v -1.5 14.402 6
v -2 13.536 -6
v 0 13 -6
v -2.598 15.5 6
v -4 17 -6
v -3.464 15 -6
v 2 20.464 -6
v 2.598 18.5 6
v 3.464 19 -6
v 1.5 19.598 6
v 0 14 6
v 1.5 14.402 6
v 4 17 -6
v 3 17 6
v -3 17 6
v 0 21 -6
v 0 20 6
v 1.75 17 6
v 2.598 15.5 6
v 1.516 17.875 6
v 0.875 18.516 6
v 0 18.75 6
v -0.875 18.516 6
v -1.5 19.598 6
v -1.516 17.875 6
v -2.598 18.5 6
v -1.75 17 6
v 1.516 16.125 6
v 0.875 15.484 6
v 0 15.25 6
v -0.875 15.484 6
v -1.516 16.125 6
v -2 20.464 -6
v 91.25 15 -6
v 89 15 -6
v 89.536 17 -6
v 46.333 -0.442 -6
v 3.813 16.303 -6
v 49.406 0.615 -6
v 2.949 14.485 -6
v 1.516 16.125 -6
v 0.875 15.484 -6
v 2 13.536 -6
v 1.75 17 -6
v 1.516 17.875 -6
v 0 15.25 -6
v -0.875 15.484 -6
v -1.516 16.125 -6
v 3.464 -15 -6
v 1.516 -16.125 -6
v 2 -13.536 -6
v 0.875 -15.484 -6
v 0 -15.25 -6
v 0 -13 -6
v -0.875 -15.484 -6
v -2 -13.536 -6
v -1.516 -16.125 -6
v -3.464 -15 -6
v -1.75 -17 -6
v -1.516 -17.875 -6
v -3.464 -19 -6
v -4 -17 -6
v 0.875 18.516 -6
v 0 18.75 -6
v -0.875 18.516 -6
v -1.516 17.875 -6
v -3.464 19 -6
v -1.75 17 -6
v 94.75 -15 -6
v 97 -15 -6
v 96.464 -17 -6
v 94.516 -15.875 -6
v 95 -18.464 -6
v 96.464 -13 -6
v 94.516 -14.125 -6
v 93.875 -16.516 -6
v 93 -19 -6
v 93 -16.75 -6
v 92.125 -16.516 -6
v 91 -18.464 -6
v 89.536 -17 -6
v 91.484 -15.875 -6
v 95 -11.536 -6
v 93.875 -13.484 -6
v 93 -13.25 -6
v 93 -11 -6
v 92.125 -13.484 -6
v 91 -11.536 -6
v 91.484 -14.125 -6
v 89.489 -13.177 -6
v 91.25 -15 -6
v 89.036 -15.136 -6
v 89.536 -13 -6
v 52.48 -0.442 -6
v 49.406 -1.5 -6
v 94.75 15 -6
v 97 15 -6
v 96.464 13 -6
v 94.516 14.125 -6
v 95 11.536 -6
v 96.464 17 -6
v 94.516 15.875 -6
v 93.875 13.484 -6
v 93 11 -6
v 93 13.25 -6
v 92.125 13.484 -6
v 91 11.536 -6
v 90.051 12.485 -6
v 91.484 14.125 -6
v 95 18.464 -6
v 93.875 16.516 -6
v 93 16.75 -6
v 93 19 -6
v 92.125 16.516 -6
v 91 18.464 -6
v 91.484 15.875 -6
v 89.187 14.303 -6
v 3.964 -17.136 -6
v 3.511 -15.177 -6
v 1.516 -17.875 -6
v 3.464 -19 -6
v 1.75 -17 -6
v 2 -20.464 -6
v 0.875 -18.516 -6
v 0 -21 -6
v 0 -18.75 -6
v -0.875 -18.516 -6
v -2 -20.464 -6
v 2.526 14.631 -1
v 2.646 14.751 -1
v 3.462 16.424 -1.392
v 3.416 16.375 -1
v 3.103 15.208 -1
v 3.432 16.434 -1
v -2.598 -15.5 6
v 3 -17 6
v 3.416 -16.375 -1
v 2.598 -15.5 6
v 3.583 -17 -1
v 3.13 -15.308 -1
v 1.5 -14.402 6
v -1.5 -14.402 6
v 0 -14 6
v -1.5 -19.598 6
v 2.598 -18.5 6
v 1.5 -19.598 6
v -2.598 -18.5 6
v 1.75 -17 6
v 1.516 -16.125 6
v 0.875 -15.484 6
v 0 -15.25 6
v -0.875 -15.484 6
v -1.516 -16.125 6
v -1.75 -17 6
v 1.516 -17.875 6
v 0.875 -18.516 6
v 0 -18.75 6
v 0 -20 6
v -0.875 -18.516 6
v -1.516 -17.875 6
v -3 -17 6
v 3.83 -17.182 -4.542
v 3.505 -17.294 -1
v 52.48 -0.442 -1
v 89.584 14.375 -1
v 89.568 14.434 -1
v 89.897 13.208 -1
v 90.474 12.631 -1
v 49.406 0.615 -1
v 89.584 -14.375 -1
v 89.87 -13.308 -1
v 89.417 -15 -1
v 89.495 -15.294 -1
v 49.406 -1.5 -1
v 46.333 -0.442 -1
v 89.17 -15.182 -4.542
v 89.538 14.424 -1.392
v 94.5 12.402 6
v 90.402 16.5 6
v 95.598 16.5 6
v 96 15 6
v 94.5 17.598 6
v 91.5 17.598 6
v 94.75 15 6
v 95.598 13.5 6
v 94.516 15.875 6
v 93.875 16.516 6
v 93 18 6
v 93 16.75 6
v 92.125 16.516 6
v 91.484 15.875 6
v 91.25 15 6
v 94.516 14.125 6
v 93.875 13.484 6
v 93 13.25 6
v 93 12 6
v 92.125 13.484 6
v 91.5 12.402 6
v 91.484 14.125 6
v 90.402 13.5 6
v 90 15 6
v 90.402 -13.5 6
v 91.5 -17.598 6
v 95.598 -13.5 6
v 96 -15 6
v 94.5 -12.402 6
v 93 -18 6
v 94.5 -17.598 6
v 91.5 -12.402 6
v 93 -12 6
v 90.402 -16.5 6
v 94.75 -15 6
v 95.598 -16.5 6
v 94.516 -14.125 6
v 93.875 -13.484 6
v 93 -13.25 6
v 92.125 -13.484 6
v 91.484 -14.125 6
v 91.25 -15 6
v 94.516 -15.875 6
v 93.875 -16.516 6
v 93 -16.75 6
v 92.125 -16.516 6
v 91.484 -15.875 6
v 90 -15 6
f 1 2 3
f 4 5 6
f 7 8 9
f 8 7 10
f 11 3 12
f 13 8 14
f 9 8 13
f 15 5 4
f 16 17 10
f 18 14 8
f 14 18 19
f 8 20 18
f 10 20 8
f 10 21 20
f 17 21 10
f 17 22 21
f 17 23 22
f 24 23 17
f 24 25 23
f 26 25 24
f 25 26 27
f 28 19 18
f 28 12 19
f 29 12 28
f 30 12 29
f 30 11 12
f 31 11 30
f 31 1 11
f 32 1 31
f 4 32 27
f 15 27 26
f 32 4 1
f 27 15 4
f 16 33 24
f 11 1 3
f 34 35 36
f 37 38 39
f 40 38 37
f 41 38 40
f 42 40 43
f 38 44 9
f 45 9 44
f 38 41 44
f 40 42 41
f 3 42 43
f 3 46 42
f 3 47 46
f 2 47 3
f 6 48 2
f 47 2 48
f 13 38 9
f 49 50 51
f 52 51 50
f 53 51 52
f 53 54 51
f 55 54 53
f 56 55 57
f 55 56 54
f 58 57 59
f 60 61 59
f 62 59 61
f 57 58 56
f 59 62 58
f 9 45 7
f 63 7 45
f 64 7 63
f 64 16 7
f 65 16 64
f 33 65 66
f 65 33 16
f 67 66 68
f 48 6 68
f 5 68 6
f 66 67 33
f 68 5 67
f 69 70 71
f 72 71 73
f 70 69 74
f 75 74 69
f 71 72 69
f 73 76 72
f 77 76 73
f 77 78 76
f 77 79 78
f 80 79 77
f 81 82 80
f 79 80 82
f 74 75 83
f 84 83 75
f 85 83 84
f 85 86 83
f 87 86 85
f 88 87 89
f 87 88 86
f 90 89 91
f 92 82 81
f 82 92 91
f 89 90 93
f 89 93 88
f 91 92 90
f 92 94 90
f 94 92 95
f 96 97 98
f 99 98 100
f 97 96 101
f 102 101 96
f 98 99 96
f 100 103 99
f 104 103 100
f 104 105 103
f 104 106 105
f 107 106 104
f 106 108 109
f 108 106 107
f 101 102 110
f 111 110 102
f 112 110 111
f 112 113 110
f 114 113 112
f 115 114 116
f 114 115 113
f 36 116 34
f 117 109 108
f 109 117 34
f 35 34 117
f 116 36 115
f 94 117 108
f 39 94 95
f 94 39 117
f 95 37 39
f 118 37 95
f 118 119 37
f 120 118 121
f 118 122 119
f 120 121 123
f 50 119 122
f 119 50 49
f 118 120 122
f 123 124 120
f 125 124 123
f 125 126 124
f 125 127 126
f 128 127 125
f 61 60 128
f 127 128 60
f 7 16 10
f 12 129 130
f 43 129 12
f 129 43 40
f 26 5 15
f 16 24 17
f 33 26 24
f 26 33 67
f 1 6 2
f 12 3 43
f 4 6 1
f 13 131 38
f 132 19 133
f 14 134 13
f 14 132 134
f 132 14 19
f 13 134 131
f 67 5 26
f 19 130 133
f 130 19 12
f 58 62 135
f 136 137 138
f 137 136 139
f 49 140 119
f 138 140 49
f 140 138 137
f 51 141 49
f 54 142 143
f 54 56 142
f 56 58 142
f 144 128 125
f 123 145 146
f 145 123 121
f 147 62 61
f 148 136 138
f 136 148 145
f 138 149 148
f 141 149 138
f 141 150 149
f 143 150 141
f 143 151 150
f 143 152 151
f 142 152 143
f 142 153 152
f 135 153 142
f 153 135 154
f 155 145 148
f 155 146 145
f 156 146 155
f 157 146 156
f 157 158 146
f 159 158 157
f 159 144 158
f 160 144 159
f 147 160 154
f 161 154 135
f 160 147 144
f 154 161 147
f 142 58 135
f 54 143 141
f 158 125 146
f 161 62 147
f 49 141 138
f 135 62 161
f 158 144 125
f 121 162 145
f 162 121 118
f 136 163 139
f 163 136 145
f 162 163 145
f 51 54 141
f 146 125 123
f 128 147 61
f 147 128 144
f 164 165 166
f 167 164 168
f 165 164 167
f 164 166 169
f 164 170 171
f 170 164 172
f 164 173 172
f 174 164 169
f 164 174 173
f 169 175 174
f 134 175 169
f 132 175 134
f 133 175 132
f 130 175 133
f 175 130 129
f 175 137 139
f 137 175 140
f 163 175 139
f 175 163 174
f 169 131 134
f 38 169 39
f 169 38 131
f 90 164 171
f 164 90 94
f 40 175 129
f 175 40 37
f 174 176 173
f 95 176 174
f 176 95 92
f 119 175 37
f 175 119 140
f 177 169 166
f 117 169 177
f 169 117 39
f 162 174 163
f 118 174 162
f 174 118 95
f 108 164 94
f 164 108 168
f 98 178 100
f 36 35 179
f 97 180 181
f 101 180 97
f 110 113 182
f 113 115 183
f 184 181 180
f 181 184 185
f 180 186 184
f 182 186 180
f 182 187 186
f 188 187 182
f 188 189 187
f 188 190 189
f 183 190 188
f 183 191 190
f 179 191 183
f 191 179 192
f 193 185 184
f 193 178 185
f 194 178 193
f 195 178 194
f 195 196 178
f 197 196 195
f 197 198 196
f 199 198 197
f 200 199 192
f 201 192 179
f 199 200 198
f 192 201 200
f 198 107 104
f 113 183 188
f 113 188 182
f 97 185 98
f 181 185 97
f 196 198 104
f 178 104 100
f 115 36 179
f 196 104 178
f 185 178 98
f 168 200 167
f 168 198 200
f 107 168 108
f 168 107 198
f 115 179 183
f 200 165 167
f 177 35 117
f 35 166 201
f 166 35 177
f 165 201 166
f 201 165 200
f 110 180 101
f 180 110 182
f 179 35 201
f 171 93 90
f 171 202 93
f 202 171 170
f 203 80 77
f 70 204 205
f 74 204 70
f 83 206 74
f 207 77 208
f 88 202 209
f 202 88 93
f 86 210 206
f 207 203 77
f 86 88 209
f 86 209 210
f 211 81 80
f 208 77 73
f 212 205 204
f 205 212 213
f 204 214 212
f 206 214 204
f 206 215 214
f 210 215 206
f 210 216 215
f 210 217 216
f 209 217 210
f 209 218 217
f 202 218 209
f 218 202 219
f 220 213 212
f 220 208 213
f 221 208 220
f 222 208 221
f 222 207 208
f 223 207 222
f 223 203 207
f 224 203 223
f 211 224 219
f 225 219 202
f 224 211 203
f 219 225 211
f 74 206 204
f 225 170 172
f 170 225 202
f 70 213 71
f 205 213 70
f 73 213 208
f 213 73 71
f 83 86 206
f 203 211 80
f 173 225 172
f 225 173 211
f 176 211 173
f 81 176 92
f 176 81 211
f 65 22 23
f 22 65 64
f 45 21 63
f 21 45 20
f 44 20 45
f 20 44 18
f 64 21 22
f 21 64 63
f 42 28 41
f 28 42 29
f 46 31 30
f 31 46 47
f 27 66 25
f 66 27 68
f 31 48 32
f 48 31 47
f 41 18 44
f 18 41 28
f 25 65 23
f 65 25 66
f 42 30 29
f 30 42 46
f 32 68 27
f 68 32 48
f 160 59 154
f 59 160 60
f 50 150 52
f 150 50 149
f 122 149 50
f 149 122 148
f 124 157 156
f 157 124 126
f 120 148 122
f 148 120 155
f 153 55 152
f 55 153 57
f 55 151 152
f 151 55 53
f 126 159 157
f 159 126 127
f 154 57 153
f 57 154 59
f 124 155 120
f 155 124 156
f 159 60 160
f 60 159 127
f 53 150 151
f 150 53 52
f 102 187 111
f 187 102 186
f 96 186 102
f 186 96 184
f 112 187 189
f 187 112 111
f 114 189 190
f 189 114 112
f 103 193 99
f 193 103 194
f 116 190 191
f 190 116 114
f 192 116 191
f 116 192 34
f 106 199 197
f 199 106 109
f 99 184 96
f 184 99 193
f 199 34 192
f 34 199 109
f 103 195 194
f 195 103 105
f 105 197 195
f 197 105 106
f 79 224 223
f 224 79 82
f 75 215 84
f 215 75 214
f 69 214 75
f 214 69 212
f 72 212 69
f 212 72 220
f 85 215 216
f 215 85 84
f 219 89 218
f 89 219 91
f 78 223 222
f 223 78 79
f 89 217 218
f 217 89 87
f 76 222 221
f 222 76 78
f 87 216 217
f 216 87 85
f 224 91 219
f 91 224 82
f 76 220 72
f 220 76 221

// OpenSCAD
boss_i_radius = 1.75;
boss_e_radius = 3;
v_space_1 = 34;
h_space = 93;
v_space = 30;
boss_height = 12;

boss_rows = 2;
boss_columns = 2;

v_offset = 0;
difference() {
  union() {
    for(h = [0:1:boss_columns-1]) {
      if(h == 0) {
        translate([0,v_space_1/2,0]) {
          cylinder($fn=12,h=boss_height, r1=boss_e_radius+1, r2=boss_e_radius, center=true);
        }
        translate([0,-v_space_1/2,0]) {
          cylinder($fn=12,h=boss_height, r1=boss_e_radius+1, r2=boss_e_radius, center=true);
        }
        translate([0,v_space_1/2-boss_e_radius/2,-boss_height/2]){
          rotate(-90+atan(h_space/(v_space+2))){
            vl = v_space/2+v_space_1/2;
            length = sqrt(vl*vl + h_space*h_space);
            cube([length,2,5], center=false);
          }
        }
       translate([0,-v_space_1/2-boss_e_radius/2,-boss_height/2]){
            rotate(+90-atan(h_space/(v_space+2))){
              vl = v_space/2+v_space_1/2;
              length = sqrt(vl*vl + h_space*h_space);
              cube([length,2,5], center=false);
            }
        }
      } else {
        translate([h_space,v_space/2,0]) {
          cylinder($fn=12,h=boss_height, r1=boss_e_radius+1, r2=boss_e_radius, center=true);
        }
        translate([h_space,-v_space/2,0]) {
          cylinder($fn=12,h=boss_height, r1=boss_e_radius+1, r2=boss_e_radius, center=true);
        }
      }
    }
   }
   for(h = [0:1:boss_columns-1]) {
      if(h == 0) {
        translate([0,v_space_1/2,0]) {
          cylinder($fn=12,h=boss_height, r1=boss_i_radius, r2=boss_i_radius, center=true);
        }
        translate([0,-v_space_1/2,0]) {
          cylinder($fn=12,h=boss_height, r1=boss_i_radius, r2=boss_i_radius, center=true);
        }
      } else {
        translate([h_space,v_space/2,0]) {
          cylinder($fn=12,h=boss_height, r1=boss_i_radius, r2=boss_i_radius, center=true);
        }
        translate([h_space,-v_space/2,0]) {
          cylinder($fn=12,h=boss_height, r1=boss_i_radius, r2=boss_i_radius, center=true);
        }
      }
    }
   }
